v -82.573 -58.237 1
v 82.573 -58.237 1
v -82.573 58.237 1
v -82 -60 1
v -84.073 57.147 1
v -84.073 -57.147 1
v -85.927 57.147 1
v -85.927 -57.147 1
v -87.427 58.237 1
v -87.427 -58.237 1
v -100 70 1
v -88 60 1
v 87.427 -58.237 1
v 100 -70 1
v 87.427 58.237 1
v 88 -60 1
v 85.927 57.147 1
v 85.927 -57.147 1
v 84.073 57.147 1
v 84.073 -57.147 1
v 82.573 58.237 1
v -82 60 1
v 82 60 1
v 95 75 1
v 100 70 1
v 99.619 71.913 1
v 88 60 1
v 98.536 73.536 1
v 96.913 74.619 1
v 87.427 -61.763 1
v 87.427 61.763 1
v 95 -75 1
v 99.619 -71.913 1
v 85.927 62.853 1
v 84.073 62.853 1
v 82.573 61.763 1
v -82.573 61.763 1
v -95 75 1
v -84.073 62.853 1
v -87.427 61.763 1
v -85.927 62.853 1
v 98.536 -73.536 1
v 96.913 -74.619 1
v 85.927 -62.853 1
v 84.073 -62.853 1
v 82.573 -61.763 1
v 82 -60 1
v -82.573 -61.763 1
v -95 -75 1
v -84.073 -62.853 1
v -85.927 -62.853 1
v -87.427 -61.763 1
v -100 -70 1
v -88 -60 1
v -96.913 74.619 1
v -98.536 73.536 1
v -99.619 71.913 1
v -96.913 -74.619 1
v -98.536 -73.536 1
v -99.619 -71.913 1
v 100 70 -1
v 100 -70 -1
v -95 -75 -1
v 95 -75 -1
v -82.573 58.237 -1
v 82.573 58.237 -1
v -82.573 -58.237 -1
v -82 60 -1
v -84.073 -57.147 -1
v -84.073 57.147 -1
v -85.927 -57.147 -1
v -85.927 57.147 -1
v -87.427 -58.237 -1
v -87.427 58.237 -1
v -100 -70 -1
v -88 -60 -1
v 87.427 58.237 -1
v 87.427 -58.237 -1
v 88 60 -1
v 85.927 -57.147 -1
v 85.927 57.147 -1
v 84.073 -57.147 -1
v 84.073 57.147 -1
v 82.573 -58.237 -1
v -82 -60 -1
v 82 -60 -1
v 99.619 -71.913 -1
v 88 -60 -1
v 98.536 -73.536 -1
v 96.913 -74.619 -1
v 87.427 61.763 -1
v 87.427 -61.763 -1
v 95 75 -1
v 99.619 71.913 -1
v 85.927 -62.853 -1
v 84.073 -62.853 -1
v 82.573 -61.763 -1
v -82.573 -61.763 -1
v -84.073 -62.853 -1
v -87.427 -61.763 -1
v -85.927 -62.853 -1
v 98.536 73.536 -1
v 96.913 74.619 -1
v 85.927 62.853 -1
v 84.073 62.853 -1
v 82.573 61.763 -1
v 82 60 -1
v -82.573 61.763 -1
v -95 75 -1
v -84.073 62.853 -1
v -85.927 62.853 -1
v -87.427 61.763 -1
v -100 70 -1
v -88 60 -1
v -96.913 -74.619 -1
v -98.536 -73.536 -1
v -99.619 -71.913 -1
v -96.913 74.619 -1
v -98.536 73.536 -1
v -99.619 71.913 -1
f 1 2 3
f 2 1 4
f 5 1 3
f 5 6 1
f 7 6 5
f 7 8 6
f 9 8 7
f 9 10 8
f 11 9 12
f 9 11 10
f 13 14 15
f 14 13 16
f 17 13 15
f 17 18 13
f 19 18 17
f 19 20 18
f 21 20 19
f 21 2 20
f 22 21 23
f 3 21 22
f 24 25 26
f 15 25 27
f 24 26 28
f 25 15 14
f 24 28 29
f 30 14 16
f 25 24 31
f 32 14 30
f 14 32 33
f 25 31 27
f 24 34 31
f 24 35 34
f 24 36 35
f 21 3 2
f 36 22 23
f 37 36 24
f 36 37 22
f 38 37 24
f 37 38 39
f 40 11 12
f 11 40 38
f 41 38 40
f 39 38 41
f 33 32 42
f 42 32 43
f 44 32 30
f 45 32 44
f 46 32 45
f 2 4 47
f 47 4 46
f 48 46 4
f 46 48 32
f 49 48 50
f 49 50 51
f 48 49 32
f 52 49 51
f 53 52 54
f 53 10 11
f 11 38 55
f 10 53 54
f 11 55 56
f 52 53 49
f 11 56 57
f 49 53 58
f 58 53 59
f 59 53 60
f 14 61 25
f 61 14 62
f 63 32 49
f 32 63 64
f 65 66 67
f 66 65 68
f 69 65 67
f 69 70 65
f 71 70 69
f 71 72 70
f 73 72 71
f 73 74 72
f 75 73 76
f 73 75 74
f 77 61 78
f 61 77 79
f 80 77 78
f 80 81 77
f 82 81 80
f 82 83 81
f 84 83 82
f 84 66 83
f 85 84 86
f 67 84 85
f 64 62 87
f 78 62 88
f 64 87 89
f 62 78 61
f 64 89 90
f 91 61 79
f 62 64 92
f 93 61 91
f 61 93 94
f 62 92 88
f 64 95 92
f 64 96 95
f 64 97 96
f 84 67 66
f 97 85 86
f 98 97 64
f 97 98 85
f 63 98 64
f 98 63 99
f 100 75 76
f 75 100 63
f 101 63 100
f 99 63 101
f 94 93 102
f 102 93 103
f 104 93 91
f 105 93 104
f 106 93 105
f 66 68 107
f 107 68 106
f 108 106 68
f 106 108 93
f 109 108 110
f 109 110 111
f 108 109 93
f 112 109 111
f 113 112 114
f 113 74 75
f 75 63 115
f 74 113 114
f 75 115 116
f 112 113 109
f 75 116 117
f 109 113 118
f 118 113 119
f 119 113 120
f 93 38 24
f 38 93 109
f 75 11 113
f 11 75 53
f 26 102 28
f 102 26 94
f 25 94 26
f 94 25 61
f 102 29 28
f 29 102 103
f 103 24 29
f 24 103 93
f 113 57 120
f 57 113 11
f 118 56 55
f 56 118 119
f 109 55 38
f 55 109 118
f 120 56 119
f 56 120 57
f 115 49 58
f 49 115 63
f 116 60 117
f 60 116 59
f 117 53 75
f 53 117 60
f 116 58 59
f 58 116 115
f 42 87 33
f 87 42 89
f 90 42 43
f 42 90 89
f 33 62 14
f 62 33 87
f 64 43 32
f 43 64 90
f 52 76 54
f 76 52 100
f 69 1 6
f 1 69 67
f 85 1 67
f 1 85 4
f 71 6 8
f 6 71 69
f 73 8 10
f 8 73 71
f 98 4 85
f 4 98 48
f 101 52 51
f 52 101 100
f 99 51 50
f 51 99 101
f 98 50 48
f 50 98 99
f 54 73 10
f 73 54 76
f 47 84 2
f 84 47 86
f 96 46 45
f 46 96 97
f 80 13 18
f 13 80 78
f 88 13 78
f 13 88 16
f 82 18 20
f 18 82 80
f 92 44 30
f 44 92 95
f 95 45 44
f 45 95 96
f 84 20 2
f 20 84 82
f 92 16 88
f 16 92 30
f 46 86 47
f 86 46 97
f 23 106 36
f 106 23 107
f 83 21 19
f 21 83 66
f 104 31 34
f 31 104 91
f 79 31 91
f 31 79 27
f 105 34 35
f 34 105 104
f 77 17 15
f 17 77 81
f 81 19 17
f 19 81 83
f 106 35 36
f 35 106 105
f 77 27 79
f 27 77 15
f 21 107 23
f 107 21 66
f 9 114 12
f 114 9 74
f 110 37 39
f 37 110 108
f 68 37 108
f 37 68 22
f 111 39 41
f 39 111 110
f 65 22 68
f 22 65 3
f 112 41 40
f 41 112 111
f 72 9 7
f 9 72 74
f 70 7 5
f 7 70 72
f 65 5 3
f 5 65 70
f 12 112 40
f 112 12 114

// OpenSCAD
// Parameters
sheet_length = 200; //[100:400:1]
sheet_width = 150; //[75:300:1]
sheet_thickness = 2; //[1:6:0.5]
chamfer_size = 0.5; //[0:2:0.1]
corner_radius = 5; //[0:20:0.5]
mount_hole_diameter = 6; //[2:12:0.5]
mount_hole_edge_offset = 15; //[5:40:1]
hole_clearance_z = 1; //[0.2:3:0.1]
overlap = 1; //[0.5:2:0.1]

// Base Shapes
module sheet_plate() {
  linear_extrude(height = sheet_thickness, center = true) {
    polygon(points = [
      [sheet_length/2 - corner_radius, sheet_width/2],
      [-sheet_length/2 + corner_radius, sheet_width/2],
      [-sheet_length/2, sheet_width/2 - corner_radius],
      [-sheet_length/2, -sheet_width/2 + corner_radius],
      [-sheet_length/2 + corner_radius, -sheet_width/2],
      [sheet_length/2 - corner_radius, -sheet_width/2],
      [sheet_length/2, -sheet_width/2 + corner_radius],
      [sheet_length/2, sheet_width/2 - corner_radius]
    ]);
  }
}

module corner_radius_cyl(pos) {
  translate(pos)
    cylinder(r = corner_radius, h = sheet_thickness, center = true);
}

module edge_chamfer_top() {
  translate([0, 0, sheet_thickness/2 - chamfer_size/2])
    linear_extrude(height = chamfer_size, center = true) {
      polygon(points = [
        [sheet_length/2 - chamfer_size - corner_radius, sheet_width/2 - chamfer_size],
        [-sheet_length/2 + chamfer_size + corner_radius, sheet_width/2 - chamfer_size],
        [-sheet_length/2 + chamfer_size, sheet_width/2 - chamfer_size - corner_radius],
        [-sheet_length/2 + chamfer_size, -sheet_width/2 + chamfer_size + corner_radius],
        [-sheet_length/2 + chamfer_size + corner_radius, -sheet_width/2 + chamfer_size],
        [sheet_length/2 - chamfer_size - corner_radius, -sheet_width/2 + chamfer_size],
        [sheet_length/2 - chamfer_size, -sheet_width/2 + chamfer_size + corner_radius],
        [sheet_length/2 - chamfer_size, sheet_width/2 - chamfer_size - corner_radius]
      ]);
    }
}

module mounting_hole(pos) {
  translate(pos)
    cylinder(r = mount_hole_diameter/2, h = sheet_thickness + hole_clearance_z, center = true);
}

// Operations
module complete_model() {
  difference() {
    union() {
      union() {
        sheet_plate();
        corner_radius_cyl([sheet_length/2 - corner_radius, sheet_width/2 - corner_radius, 0]);
        corner_radius_cyl([-sheet_length/2 + corner_radius, sheet_width/2 - corner_radius, 0]);
        corner_radius_cyl([-sheet_length/2 + corner_radius, -sheet_width/2 + corner_radius, 0]);
        corner_radius_cyl([sheet_length/2 - corner_radius, -sheet_width/2 + corner_radius, 0]);
      }
      edge_chamfer_top();
    }
    mounting_hole([-sheet_length/2 + mount_hole_edge_offset, -sheet_width/2 + mount_hole_edge_offset, 0]);
    mounting_hole([sheet_length/2 - mount_hole_edge_offset, -sheet_width/2 + mount_hole_edge_offset, 0]);
    mounting_hole([sheet_length/2 - mount_hole_edge_offset, sheet_width/2 - mount_hole_edge_offset, 0]);
    mounting_hole([-sheet_length/2 + mount_hole_edge_offset, sheet_width/2 - mount_hole_edge_offset, 0]);
  }
}

// Final Output
color([0.1, 0.1, 0.1]) // Carbon-fiber sheet color
complete_model();
